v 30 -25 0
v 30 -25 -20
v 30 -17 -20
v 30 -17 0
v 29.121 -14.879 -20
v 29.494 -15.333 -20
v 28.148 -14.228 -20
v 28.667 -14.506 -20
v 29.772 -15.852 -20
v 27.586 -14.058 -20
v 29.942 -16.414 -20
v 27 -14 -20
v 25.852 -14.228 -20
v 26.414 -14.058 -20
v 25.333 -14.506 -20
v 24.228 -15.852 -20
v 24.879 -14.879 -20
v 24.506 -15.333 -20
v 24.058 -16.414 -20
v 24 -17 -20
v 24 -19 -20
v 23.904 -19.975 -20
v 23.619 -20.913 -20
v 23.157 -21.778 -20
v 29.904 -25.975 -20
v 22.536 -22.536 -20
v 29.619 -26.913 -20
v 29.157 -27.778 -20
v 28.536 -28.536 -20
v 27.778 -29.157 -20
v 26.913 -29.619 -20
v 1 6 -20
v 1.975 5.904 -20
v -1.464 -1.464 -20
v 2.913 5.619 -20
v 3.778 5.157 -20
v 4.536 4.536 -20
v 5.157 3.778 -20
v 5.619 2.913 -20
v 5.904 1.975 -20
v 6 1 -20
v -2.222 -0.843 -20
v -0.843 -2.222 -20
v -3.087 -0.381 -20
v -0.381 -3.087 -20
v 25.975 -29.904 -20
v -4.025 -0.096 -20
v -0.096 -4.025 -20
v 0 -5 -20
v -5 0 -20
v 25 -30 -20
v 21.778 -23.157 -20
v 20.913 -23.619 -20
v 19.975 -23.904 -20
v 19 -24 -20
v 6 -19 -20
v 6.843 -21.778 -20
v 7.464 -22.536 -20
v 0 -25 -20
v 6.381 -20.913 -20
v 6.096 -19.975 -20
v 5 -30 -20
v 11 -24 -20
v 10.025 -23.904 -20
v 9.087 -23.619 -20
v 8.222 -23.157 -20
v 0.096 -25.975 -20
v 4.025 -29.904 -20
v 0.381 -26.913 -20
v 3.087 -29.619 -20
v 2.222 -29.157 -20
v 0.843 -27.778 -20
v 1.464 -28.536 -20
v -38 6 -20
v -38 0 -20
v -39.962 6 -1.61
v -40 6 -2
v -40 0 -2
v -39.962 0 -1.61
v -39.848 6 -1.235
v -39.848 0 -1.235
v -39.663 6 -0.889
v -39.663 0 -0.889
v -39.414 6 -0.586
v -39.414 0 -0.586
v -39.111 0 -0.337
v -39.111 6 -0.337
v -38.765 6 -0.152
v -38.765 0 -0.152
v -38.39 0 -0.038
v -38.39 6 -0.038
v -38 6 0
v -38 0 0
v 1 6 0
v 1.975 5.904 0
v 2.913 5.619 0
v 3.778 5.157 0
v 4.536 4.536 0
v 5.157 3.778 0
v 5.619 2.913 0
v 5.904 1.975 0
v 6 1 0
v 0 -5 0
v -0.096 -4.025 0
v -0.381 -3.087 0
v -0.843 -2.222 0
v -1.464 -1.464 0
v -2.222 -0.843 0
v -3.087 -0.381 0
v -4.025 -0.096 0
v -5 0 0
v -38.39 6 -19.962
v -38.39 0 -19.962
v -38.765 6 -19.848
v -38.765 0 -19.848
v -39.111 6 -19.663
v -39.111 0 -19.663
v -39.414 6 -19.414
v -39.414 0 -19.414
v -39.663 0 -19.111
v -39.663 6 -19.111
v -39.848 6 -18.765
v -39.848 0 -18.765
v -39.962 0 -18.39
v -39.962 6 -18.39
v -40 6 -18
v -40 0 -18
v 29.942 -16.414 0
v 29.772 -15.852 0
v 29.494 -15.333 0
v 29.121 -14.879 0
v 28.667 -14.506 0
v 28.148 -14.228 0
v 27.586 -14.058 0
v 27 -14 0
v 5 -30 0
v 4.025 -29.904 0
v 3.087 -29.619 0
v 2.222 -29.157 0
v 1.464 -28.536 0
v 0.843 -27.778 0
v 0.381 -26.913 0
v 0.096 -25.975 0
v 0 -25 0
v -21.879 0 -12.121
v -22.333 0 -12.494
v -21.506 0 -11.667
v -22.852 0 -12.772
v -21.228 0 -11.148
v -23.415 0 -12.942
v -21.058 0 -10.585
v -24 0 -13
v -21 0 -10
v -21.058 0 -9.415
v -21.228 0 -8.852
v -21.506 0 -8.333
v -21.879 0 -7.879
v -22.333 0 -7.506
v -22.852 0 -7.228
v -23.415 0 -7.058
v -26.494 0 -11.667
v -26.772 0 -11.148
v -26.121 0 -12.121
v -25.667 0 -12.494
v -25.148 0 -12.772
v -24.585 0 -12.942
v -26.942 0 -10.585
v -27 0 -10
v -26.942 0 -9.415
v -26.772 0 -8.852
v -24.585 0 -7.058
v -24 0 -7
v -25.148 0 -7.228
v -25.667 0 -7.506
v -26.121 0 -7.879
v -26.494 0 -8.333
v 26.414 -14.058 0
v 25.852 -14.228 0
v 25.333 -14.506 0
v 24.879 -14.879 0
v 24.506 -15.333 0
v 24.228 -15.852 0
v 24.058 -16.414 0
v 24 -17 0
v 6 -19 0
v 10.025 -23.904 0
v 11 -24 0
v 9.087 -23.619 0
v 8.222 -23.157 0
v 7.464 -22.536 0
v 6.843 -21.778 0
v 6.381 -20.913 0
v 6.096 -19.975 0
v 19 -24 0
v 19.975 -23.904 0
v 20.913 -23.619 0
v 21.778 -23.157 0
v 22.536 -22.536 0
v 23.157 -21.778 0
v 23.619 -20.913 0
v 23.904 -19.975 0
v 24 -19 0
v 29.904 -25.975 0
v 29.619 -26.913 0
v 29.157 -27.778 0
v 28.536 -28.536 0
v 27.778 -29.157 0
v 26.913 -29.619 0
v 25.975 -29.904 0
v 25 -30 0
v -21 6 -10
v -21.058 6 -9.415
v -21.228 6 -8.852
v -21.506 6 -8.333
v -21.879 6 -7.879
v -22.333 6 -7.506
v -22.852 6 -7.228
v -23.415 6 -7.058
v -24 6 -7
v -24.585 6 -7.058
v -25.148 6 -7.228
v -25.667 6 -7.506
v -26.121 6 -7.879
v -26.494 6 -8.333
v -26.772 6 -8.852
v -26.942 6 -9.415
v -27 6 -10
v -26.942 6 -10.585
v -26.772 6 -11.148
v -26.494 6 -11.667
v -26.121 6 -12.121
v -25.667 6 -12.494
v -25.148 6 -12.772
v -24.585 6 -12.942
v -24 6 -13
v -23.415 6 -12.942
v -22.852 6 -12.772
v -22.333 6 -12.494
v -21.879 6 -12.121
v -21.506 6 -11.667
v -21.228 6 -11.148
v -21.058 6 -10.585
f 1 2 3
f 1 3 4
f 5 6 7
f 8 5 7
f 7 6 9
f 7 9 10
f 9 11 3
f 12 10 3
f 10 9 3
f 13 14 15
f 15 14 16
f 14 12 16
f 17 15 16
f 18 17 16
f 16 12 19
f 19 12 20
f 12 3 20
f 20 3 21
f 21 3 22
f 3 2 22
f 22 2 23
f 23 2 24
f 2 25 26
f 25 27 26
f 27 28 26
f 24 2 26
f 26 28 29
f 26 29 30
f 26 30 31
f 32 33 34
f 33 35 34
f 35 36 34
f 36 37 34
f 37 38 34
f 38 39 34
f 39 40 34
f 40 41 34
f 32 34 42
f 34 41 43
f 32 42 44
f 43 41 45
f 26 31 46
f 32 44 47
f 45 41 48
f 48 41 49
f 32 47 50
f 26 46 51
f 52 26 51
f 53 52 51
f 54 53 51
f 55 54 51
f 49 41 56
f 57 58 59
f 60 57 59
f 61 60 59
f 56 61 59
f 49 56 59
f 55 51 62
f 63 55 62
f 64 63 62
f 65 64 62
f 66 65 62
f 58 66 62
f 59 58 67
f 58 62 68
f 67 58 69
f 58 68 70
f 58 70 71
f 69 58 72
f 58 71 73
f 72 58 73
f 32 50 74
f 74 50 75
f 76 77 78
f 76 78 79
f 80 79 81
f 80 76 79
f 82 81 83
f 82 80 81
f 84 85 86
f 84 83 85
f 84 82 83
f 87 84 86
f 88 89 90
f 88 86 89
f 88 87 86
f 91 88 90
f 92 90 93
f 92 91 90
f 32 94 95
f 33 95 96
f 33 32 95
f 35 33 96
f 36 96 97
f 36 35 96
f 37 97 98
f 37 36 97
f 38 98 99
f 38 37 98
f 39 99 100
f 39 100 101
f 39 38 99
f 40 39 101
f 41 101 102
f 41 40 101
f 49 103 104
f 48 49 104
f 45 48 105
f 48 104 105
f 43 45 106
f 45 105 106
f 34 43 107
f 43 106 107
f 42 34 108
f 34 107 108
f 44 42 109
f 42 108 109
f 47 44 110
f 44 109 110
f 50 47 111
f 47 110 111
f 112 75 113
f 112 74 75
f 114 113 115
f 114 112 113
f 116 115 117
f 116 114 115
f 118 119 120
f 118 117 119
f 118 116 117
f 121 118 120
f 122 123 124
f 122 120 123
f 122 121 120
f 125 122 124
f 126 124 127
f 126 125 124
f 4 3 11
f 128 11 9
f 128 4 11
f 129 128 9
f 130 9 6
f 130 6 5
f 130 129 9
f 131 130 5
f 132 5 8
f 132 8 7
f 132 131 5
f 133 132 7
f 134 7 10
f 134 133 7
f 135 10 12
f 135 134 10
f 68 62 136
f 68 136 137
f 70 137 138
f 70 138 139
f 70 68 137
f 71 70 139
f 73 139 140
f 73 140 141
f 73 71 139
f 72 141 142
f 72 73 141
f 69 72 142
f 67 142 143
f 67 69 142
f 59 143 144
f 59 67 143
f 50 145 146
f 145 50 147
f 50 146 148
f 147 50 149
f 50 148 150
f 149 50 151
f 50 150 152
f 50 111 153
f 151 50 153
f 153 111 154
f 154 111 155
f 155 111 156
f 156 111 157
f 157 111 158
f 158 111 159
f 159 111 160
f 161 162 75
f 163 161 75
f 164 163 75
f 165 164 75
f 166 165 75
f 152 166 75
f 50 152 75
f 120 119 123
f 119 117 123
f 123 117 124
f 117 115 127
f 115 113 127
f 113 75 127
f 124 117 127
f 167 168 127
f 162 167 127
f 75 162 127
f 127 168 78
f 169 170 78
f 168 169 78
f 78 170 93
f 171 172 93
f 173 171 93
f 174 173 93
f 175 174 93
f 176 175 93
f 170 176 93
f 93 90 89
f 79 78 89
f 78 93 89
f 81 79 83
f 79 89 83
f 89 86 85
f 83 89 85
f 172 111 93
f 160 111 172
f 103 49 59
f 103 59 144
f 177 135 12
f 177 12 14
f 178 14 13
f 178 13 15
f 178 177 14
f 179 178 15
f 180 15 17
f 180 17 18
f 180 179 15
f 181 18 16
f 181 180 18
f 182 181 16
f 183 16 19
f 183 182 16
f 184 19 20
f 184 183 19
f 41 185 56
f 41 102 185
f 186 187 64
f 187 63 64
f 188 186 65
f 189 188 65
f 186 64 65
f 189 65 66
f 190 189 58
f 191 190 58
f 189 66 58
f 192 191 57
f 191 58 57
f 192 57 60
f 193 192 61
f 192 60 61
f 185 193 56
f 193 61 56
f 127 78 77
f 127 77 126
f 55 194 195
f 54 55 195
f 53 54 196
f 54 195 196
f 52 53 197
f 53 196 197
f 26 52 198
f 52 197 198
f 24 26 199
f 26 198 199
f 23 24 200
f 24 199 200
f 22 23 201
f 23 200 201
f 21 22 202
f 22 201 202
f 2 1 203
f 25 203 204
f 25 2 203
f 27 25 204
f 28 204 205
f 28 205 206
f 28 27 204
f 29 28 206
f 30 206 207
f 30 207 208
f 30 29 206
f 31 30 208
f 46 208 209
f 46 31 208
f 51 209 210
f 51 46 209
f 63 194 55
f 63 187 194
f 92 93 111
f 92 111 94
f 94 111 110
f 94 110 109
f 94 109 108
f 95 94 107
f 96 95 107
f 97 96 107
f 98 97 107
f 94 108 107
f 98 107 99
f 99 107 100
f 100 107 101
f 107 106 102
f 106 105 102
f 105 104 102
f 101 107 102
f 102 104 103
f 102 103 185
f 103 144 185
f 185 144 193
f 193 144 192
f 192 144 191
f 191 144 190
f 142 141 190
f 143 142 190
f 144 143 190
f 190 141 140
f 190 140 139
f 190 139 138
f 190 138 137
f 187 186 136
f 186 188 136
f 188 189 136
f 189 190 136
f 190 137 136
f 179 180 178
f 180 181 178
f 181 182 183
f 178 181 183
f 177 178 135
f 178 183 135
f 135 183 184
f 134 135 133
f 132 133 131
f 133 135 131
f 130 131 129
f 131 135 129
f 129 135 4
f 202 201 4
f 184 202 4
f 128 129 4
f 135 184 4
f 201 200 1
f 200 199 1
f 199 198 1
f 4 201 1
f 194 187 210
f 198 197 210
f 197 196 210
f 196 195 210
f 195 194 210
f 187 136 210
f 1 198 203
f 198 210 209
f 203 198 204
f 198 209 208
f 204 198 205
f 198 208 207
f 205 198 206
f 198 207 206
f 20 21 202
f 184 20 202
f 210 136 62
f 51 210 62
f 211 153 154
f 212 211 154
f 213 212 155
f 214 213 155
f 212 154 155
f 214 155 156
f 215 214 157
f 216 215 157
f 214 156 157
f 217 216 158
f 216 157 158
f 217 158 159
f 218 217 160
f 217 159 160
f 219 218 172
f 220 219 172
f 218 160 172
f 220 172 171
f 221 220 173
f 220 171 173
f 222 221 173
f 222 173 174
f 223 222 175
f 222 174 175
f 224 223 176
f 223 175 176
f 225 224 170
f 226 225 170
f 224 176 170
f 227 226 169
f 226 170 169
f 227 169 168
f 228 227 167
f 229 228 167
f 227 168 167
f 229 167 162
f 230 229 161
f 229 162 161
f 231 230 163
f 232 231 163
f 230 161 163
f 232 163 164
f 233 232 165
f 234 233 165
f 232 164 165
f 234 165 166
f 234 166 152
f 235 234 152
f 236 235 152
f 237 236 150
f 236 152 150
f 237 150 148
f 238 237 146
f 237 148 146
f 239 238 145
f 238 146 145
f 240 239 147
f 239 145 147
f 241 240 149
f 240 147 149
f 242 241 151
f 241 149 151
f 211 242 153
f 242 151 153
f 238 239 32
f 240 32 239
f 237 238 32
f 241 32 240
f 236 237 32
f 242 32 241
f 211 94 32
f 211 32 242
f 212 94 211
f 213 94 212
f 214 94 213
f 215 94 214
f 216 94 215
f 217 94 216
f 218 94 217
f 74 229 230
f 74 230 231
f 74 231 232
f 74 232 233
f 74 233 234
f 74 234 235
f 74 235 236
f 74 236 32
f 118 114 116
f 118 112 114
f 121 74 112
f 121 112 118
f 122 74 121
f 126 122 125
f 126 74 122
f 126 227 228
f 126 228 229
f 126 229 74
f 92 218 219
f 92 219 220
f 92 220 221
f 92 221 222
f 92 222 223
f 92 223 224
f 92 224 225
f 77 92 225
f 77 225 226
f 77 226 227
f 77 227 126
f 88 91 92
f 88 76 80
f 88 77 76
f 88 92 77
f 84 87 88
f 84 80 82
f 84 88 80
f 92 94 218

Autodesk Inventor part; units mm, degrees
ref_plane "YZ Plane" through (0, 0, 0) normal (1, 0, 0) x (0, 1, 0)
ref_plane "XZ Plane" through (0, 0, 0) normal (0, 1, 0) x (-1, 0, 0)
ref_plane "XY Plane" through (0, 0, 0) normal (0, 0, 1) x (1, 0, 0)
sketch "Sketch1" plane through (0, 0, 0) normal (0, 1, 0) x (-1, 0, 0)
  line L0 (0, 0) -> (40, 0)
  line L1 (40, 0) -> (40, -20)
  line L2 (40, -20) -> (0, -20)
  line L3 (0, -20) -> (0, 0)
  dimension "d0" = 40
  dimension "d1" = 20
extrude "Extrusion1" add sketch "Sketch1" along normal blind 6
sketch "Sketch2" plane through (0, 6, 0) normal (0, 1, 0) x (1, 0, 0)
  line L0 (0, 0) -> (6, 0)
  line L1 (6, 0) -> (6, 20)
  line L2 (6, 20) -> (0, 20)
  line L3 (0, 20) -> (0, 0)
  dimension "d4" = 6
  dimension "d5" = 20
extrude "Extrusion2" add sketch "Sketch2" against normal blind 30
fillet "Fillet1" radius 5 1 edges at (0, 0, -10)
fillet "Fillet4" radius 5 1 edges at (6, 6, -10)
sketch "Sketch5" plane through (0, 0, 0) normal (0, -1, 0) x (1, 0, 0)
  circle A0 centre (-24, -10) radius 3
  line L0 (-40, -20) -> (-40, 0) projected
  line L1 (-5, -20) -> (-40, -20) projected
  line L2 (6, -20) -> (6, 0) projected
  circle A1 centre (-44, -10) radius 3
  line L3 (-40, 0) -> (-5, 0) projected
  point P0 (0, 0)
  dimension "d18" = 6
  dimension "d20" = 10
  dimension "d47" = 30
  dimension "d48" = 6
  dimension "d49" = 20
  dimension "d50" = 10
fillet "Fillet7" radius 2 2 edges at (-40, 3, 0) (-40, 3, -20)
sketch "Sketch8" plane through (0, -24, -20) normal (-1, 0, 0) x (0, 0, 1)
  line L0 (20, 0) -> (0, 0) projected
  line L1 (0, 0) -> (20, 0)
  line L2 (20, 0) -> (20, -6)
  line L3 (20, -6) -> (0, -6)
  line L4 (0, -6) -> (0, 0)
  point P0 (20, 24)
  dimension "d35" = 6
extrude "Extrusion6" add sketch "Sketch8" against normal blind 30
fillet "Fillet8" radius 5 1 edges at (0, -30, -10)
fillet "Fillet9" radius 5 1 edges at (6, -24, -10)
sketch "Sketch9" plane through (30, -24, 0) normal (0, 1, 0) x (1, 0, 0)
  line L0 (0, 20) -> (0, 0) projected
  line L1 (0, 20) -> (-6, 20)
  line L2 (-6, 20) -> (-6, 0)
  line L3 (-6, 0) -> (0, 0)
  line L4 (0, 0) -> (0, 20)
  point P0 (-30, 0)
  dimension "d40" = 6
  dimension "d41" = 20
extrude "Extrusion7" add sketch "Sketch9" along normal blind 10
fillet "Fillet10" radius 5 1 edges at (24, -24, -10)
fillet "Fillet11" radius 5 1 edges at (30, -30, -10)
fillet "Fillet12" radius 3 2 edges at (24, -14, -10) (30, -14, -10)
extrude "Extrusion8" cut sketch "Sketch5" against normal through all both and the other way through all
properties part number "Cable_Guide_Holder"
